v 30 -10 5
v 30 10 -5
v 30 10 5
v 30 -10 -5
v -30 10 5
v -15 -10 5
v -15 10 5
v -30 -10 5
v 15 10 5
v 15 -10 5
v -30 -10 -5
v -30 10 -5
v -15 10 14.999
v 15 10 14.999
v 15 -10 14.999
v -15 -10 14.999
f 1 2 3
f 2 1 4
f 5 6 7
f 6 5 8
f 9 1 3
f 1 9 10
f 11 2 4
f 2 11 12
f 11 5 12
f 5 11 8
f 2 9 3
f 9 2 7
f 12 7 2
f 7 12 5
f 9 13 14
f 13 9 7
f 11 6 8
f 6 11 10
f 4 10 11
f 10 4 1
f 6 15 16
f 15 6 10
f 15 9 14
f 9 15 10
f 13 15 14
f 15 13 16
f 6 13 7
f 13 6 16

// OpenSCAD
cube([60,20,10],center=true);
translate([0,0,10-0.001])
    cube([30,20,10],center=true);
cylinder(h=3, r=9);
